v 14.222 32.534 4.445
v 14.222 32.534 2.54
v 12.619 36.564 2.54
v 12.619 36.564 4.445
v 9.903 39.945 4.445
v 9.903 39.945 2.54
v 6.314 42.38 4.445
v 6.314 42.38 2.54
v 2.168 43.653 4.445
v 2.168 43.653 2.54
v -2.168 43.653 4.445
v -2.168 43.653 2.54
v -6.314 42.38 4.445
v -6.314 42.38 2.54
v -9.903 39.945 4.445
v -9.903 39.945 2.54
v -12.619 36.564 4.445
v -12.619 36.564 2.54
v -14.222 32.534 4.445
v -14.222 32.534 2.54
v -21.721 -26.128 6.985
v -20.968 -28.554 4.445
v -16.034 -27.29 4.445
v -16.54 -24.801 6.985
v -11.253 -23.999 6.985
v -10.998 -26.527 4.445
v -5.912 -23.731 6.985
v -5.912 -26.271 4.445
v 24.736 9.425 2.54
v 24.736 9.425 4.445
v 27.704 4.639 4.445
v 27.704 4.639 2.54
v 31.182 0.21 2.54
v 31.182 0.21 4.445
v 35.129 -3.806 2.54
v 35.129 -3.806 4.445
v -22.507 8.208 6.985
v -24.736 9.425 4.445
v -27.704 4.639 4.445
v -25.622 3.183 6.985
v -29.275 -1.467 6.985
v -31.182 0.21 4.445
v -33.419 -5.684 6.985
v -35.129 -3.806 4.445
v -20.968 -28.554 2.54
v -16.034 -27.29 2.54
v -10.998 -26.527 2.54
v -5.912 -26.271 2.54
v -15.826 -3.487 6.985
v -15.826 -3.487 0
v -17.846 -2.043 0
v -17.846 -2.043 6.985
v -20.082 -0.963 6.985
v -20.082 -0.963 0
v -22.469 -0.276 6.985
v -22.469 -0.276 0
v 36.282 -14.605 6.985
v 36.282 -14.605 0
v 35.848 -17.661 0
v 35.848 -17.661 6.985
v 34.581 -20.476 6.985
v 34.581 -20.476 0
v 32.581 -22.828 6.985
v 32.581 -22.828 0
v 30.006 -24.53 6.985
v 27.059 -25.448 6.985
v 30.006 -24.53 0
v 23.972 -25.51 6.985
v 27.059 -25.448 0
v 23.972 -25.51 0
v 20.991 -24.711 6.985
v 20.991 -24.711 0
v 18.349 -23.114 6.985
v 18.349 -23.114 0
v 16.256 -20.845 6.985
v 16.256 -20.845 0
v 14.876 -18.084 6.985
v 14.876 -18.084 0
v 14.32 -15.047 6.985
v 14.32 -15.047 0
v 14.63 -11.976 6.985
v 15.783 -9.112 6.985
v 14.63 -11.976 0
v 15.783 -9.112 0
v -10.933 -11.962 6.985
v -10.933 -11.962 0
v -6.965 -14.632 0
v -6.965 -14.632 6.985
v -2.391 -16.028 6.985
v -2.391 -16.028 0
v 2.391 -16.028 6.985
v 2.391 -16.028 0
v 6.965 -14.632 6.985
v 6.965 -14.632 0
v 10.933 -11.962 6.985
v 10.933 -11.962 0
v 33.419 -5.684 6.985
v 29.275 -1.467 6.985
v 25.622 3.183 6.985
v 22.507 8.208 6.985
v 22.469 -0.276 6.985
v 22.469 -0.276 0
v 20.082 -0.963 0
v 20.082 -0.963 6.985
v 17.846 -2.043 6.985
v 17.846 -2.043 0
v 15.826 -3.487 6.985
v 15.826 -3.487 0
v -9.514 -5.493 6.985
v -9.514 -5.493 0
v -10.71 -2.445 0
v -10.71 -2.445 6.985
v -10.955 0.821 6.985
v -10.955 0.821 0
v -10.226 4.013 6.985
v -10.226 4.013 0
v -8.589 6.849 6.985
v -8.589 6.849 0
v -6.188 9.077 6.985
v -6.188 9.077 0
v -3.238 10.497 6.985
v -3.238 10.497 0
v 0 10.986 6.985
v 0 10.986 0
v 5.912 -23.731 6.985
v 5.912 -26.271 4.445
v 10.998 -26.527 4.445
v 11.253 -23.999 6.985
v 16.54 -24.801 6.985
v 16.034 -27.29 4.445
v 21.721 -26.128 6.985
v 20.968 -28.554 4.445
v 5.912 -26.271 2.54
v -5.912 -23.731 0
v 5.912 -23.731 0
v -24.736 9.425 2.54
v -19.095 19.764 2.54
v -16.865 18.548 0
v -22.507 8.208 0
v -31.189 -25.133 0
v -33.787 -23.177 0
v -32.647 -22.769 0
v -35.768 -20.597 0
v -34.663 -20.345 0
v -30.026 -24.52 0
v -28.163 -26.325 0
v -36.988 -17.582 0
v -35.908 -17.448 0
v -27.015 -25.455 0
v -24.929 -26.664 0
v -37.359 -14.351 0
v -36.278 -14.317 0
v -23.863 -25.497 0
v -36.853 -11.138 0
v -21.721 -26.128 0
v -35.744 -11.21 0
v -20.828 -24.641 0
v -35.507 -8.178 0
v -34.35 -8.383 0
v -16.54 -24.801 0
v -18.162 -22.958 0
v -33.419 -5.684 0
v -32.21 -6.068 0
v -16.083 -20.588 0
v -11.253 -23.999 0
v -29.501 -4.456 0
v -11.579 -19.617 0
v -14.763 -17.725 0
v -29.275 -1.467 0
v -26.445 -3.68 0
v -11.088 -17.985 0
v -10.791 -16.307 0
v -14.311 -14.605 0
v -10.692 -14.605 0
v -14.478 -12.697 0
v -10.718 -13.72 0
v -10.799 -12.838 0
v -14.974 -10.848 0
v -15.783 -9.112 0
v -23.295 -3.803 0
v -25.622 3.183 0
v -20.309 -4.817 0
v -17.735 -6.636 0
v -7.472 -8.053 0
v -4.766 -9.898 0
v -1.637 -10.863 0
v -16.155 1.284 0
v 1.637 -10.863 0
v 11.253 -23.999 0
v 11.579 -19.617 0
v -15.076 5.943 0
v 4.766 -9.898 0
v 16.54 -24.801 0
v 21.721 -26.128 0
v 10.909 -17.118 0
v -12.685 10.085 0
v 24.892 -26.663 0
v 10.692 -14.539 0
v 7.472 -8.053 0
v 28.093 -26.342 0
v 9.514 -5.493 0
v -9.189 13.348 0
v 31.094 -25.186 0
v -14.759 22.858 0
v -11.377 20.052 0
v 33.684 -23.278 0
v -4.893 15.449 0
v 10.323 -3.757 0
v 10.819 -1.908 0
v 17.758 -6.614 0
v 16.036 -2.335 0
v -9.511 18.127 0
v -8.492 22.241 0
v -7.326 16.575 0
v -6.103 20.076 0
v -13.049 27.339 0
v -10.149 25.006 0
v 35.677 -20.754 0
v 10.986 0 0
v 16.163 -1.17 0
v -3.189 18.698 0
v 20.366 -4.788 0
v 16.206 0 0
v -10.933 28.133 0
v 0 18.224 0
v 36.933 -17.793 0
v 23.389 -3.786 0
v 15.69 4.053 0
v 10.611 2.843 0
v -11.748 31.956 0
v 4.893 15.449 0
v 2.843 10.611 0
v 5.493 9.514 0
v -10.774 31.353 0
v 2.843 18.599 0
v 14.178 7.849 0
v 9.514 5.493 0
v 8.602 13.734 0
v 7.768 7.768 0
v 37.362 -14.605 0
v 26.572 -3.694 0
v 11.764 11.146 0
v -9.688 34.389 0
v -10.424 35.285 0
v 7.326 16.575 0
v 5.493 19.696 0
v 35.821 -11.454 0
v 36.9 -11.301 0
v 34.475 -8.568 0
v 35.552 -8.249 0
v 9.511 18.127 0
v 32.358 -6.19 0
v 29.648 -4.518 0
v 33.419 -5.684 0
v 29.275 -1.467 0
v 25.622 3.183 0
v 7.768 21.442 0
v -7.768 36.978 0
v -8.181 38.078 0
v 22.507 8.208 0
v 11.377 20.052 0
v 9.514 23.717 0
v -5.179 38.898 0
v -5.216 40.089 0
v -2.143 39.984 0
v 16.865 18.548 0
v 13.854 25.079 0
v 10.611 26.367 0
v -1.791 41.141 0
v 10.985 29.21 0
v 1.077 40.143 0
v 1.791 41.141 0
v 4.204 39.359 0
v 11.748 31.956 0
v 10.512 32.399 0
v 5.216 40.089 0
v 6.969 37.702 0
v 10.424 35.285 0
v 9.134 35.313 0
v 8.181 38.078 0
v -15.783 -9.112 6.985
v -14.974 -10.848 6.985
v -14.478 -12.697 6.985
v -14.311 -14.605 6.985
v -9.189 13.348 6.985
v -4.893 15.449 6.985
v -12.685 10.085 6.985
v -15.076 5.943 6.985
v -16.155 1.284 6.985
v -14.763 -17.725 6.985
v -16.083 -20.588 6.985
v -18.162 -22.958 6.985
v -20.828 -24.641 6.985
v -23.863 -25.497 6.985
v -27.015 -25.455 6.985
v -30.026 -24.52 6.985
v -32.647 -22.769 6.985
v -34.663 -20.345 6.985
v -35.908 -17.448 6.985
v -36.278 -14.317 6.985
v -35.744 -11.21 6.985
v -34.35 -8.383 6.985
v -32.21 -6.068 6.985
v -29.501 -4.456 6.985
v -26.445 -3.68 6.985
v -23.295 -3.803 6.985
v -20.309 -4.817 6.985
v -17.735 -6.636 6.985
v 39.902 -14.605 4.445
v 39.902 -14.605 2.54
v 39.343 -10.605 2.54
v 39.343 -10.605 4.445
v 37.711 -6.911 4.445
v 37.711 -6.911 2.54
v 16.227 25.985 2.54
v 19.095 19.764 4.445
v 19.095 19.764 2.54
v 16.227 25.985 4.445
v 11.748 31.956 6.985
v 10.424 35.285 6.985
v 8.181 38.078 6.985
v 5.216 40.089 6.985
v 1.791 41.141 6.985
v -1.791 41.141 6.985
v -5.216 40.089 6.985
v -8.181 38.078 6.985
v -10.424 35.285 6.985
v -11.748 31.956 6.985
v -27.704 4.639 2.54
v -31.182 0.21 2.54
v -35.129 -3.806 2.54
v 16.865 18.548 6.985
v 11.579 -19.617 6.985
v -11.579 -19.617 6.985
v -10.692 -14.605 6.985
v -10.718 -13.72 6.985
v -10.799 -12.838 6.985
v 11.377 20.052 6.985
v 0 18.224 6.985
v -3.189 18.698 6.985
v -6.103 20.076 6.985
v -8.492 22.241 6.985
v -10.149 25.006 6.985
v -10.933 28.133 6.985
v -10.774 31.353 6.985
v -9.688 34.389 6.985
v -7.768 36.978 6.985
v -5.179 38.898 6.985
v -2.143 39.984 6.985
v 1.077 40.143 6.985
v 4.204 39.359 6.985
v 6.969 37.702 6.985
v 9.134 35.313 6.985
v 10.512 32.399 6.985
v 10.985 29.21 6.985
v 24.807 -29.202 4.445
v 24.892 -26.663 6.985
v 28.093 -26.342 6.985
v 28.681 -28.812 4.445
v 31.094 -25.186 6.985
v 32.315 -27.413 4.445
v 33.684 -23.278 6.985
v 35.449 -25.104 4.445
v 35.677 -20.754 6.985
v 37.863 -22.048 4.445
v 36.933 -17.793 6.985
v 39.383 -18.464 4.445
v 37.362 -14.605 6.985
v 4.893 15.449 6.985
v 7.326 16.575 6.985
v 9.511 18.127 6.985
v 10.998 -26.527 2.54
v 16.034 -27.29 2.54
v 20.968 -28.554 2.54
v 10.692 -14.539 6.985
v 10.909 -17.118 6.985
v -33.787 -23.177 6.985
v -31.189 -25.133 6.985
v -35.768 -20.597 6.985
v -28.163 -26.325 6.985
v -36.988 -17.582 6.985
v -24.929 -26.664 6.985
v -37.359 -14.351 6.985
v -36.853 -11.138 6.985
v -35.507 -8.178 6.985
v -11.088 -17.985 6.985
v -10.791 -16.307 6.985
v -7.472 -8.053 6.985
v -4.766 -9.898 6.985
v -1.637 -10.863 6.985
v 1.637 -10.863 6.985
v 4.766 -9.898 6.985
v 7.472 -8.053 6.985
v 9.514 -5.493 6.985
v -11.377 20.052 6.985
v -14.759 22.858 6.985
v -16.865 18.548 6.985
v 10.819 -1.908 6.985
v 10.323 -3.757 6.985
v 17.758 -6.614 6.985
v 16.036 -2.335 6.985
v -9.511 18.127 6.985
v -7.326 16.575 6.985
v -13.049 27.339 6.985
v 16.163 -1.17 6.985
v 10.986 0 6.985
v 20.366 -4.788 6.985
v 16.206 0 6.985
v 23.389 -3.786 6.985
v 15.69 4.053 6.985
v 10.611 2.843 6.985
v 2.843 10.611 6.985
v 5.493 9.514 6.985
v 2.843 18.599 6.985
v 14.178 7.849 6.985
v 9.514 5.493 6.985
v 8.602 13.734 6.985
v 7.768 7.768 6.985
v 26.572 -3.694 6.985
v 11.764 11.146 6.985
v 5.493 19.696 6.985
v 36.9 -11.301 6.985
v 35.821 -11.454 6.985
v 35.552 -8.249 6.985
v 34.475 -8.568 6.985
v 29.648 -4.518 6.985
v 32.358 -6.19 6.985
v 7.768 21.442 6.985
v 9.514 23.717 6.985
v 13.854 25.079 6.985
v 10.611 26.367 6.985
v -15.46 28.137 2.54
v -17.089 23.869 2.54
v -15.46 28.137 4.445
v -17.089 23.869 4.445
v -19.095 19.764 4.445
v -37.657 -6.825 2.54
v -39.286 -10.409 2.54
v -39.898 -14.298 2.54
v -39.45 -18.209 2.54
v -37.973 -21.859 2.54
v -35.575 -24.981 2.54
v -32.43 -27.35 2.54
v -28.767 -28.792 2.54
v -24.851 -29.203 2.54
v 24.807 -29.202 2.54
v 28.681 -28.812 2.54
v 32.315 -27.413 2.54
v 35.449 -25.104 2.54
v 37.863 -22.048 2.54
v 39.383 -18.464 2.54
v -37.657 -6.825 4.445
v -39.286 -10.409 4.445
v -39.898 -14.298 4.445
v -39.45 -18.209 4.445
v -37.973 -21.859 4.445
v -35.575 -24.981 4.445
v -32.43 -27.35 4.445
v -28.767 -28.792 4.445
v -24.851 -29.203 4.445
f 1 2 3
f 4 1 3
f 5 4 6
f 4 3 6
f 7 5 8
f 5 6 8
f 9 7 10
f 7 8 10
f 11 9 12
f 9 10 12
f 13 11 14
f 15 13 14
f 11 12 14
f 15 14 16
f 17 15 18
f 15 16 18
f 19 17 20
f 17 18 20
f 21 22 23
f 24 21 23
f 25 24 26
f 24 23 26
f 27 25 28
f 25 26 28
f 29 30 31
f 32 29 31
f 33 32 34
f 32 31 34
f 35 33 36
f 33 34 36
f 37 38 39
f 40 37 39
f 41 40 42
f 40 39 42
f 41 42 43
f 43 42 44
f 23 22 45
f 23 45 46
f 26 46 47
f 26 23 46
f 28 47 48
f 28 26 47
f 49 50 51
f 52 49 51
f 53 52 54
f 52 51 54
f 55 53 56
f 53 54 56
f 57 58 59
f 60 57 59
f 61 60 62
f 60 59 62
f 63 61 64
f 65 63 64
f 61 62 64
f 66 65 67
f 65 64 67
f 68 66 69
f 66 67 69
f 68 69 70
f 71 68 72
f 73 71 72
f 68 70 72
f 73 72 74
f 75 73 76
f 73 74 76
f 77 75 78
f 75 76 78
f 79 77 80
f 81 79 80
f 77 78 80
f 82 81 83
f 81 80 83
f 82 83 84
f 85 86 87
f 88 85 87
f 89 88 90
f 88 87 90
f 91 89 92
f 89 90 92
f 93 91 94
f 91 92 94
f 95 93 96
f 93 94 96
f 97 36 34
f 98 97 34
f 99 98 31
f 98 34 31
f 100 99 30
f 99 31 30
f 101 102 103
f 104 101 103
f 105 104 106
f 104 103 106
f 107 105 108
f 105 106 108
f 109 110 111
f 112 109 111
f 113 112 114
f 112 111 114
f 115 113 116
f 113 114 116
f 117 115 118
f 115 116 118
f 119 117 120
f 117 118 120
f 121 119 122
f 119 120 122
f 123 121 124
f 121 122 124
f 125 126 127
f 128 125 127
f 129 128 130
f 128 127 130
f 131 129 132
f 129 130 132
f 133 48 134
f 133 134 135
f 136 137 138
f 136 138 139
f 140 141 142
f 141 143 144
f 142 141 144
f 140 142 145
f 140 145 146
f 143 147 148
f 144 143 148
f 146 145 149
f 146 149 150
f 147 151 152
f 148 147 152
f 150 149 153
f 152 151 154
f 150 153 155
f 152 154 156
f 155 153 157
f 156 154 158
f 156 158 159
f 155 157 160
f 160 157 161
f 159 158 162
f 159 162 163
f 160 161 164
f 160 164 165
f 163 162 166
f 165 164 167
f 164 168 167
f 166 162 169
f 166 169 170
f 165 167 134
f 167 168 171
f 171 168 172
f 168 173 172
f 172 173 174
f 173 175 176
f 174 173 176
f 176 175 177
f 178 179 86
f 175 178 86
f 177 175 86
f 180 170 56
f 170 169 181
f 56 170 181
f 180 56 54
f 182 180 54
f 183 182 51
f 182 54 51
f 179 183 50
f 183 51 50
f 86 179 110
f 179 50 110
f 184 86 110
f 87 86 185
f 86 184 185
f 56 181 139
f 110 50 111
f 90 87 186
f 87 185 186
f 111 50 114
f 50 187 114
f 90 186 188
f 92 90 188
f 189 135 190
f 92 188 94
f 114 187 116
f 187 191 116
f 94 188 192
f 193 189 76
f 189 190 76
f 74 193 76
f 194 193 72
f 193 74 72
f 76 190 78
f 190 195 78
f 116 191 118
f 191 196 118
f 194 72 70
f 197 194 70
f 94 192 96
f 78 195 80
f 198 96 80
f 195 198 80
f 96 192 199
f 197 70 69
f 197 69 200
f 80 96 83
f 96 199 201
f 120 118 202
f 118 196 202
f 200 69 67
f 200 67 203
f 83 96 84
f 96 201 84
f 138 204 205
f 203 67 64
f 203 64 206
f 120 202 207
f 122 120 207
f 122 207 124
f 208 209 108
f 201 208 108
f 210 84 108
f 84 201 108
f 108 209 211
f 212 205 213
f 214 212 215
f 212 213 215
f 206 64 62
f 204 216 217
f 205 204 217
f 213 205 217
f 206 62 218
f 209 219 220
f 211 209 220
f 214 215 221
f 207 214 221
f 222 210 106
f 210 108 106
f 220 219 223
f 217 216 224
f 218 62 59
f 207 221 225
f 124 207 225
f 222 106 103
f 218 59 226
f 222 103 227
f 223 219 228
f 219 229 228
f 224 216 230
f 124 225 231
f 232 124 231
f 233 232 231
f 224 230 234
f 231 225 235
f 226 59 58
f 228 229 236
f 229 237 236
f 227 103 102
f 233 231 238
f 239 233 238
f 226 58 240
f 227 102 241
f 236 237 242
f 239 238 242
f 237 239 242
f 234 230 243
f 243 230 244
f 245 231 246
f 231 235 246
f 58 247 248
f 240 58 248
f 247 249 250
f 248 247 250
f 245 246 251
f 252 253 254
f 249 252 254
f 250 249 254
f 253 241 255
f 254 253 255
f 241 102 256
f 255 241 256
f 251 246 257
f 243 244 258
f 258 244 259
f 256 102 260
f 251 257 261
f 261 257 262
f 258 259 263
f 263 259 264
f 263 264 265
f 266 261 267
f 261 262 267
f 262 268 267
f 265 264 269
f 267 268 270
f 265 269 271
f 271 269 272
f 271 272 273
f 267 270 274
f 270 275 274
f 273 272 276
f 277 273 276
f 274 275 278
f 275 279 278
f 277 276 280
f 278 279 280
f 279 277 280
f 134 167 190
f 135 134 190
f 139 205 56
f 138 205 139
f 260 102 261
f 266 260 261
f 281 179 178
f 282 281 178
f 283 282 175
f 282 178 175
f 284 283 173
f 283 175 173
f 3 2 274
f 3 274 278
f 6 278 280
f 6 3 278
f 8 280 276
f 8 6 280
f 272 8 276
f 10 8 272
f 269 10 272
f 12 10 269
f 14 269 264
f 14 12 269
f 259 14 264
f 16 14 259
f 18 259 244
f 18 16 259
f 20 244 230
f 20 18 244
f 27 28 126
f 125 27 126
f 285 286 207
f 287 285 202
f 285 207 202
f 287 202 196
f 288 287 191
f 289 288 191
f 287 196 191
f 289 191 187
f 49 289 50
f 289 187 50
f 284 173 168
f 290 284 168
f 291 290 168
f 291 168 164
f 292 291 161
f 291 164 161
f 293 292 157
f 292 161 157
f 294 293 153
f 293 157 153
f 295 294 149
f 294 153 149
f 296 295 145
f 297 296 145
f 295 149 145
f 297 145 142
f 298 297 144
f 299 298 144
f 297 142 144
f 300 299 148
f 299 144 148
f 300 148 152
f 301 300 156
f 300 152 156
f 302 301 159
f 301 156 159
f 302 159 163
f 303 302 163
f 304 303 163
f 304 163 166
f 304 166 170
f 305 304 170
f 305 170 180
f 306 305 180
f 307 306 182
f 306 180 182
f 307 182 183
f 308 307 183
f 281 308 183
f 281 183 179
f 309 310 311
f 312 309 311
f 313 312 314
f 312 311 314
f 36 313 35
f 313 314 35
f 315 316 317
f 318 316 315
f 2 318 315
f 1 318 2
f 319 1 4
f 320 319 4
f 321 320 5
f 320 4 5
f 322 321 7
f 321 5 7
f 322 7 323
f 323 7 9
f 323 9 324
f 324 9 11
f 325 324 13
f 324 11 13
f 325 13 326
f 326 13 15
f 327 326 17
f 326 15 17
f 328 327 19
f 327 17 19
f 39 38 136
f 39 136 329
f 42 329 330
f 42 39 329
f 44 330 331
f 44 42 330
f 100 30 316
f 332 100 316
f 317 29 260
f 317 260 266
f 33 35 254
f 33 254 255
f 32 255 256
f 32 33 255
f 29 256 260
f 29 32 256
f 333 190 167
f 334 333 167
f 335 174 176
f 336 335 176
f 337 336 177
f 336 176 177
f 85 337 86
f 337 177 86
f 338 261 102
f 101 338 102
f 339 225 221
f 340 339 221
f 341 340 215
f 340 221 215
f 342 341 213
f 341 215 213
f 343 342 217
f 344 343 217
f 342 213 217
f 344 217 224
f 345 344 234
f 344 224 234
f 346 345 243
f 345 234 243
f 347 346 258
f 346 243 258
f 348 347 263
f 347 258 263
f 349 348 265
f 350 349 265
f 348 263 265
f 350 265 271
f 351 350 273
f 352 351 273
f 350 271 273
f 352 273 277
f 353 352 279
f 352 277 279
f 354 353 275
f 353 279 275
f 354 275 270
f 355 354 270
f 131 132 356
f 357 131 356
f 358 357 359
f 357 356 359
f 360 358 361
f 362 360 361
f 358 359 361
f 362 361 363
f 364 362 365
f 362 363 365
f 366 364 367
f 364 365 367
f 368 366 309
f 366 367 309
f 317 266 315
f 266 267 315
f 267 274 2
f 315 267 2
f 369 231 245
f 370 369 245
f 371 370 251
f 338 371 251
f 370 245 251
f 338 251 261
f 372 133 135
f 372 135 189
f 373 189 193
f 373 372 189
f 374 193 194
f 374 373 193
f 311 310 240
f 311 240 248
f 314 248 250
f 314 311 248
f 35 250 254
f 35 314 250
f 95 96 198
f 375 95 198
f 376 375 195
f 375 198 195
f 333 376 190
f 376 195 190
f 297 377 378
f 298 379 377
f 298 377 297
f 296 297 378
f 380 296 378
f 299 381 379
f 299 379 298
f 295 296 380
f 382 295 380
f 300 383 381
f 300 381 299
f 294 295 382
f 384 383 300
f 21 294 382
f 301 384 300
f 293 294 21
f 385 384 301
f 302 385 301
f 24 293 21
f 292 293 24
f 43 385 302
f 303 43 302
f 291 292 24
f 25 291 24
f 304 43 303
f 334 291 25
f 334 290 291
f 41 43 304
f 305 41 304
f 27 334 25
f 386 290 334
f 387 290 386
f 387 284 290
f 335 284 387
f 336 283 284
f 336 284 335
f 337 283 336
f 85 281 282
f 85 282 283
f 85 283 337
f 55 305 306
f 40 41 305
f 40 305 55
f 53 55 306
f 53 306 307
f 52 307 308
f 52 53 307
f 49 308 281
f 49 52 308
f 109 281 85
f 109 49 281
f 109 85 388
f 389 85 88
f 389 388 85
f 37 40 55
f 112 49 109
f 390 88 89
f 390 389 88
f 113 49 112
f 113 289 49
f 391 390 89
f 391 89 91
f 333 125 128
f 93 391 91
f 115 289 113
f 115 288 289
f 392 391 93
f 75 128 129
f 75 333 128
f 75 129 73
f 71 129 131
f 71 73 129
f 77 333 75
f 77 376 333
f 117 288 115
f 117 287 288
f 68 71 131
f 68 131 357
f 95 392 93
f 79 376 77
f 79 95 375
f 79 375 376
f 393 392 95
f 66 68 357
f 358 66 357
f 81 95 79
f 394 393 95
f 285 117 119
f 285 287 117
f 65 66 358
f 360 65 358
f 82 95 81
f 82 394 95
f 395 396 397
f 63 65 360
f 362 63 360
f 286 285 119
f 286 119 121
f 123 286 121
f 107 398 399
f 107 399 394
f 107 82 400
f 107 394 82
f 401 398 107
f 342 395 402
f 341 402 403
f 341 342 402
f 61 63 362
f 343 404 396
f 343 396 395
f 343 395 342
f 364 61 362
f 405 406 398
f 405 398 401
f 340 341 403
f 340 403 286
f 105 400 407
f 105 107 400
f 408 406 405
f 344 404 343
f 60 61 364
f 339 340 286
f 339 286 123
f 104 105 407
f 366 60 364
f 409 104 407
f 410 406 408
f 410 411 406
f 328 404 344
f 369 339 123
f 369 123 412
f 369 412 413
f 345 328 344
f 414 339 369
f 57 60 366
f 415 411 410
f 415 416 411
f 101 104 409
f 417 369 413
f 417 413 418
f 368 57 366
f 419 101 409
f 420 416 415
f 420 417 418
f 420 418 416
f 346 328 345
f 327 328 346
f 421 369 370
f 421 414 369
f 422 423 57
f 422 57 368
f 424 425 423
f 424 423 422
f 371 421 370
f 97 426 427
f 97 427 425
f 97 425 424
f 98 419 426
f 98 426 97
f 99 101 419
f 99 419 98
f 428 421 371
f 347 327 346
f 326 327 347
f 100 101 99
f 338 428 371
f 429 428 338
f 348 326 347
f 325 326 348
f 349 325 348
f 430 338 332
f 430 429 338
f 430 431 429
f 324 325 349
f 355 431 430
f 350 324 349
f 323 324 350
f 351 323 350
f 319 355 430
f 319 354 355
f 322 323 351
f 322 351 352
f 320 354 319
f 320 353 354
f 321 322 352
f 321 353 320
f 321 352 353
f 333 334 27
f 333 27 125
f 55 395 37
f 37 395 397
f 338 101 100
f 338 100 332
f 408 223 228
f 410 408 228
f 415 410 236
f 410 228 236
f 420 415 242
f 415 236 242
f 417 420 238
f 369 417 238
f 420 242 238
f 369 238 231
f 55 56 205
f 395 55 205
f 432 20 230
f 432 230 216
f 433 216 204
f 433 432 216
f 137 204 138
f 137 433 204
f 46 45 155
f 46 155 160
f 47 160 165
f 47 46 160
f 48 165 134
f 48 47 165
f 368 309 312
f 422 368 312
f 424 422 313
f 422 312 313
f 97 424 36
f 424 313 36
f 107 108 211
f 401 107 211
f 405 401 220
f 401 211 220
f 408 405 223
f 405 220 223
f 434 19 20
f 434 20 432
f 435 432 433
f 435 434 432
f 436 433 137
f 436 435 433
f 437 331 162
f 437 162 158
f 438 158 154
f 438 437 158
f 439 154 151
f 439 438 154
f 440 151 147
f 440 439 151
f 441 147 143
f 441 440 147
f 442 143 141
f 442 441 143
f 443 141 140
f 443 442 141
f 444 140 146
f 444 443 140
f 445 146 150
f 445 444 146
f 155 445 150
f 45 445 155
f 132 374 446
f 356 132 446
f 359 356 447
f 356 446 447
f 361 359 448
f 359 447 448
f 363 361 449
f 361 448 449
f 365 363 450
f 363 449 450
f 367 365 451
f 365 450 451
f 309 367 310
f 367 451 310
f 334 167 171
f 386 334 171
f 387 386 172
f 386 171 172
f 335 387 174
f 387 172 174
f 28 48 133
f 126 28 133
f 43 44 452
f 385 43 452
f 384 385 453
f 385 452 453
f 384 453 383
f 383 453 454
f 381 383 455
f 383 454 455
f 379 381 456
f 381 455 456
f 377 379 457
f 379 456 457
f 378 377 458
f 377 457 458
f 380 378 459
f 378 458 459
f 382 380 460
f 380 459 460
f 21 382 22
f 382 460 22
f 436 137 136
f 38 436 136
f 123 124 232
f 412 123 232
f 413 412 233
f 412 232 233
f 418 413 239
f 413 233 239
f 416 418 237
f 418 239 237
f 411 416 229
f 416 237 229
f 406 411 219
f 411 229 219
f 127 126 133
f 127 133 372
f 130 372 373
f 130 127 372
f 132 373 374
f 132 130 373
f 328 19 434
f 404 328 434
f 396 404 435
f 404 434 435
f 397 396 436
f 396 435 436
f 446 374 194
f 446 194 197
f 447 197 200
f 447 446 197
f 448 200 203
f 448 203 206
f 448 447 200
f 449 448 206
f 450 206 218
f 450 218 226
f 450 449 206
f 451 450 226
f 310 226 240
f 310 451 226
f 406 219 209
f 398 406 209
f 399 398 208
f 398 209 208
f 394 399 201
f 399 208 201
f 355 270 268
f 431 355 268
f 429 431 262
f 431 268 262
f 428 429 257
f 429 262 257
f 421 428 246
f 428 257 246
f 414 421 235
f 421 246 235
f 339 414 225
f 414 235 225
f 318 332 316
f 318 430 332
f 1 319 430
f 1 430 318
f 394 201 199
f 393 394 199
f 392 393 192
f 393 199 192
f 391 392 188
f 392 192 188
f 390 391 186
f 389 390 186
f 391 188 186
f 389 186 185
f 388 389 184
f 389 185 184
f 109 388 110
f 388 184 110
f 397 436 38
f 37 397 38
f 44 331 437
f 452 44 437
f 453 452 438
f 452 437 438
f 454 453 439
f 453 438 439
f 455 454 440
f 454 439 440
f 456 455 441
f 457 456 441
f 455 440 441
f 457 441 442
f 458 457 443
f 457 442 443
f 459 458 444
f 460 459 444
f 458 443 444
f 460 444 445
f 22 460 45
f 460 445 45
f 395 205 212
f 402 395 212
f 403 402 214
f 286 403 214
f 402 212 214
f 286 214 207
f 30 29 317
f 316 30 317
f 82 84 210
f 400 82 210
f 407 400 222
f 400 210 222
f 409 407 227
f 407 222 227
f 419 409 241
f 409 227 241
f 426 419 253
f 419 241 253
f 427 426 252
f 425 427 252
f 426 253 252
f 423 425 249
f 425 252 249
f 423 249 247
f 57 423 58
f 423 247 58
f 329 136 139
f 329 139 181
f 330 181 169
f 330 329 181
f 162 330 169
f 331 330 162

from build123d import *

# Parameters (mm, degrees)
F1_DEPTH = 6.985
F2_R     = 50.8
F3_SIZE  = 2.54


with BuildPart() as f1:
    # F0 (on Top) → F1 (new body)
    with BuildSketch(Plane.XY):
        with BuildLine():
            Line((-22.4686733496, -0.2763976852), (-11.3768203047, 20.0517258855))
            ThreePointArc((-11.3768203047, 20.0517258855), (-13.5749073132, 23.8222438401), (-14.5607446546, 28.0738925649))
            Line((-14.5607446546, 28.0738925649), (-30.3766020445, -0.9119497554))
            ThreePointArc((-30.3766020445, -0.9119497554), (-26.4666182407, -0.0469408196), (-22.4686733496, -0.2763976852))
        make_face()
        with BuildLine():
            ThreePointArc((14.5607446546, 28.0738925649), (13.5749073132, 23.8222438401), (11.3768203047, 20.0517258855))
            Line((11.3768203047, 20.0517258855), (22.4686733496, -0.2763976852))
            ThreePointArc((22.4686733496, -0.2763976852), (26.4666182407, -0.0469408196), (30.3766020445, -0.9119497554))
            Line((30.3766020445, -0.9119497554), (14.5607446546, 28.0738925649))
        make_face()
        with BuildLine():
            ThreePointArc((-4.8932738406, 15.4491171751), (-2.4756966767, 16.0153138069), (0, 16.2055345598))
            ThreePointArc((0, 16.2055345598), (2.4756966767, 16.0153138069), (4.8932738406, 15.4491171751))
            ThreePointArc((4.8932738406, 15.4491171751), (8.4542884153, 17.3007165459), (11.3768203047, 20.0517258855))
            ThreePointArc((11.3768203047, 20.0517258855), (13.5749073132, 23.8222438401), (14.5607446546, 28.0738925649))
            ThreePointArc((14.5607446546, 28.0738925649), (14.5939319698, 28.6415154708), (14.605, 29.21))
            ThreePointArc((14.605, 29.21), (-0.5684845292, 43.8039319698), (-14.5607446546, 28.0738925649))
            ThreePointArc((-14.5607446546, 28.0738925649), (-13.5749073132, 23.8222438401), (-11.3768203047, 20.0517258855))
            ThreePointArc((-11.3768203047, 20.0517258855), (-8.4542884153, 17.3007165459), (-4.8932738406, 15.4491171751))
        make_face()
        with BuildLine():
            ThreePointArc((10.9855, 29.21), (7.7679215447, 21.4420784553), (0, 18.2245))
            ThreePointArc((0, 18.2245), (-7.7679215447, 36.9779215447), (10.9855, 29.21))
        make_face(mode=Mode.SUBTRACT)
        with BuildLine():
            Line((0, 16.2055345598), (0, 14.605))
            ThreePointArc((0, 14.605), (2.4827737857, 14.8175763219), (4.8932738406, 15.4491171751))
            ThreePointArc((4.8932738406, 15.4491171751), (2.4756966767, 16.0153138069), (0, 16.2055345598))
        make_face()
        with BuildLine():
            ThreePointArc((-4.8932738406, 15.4491171751), (-2.4827737857, 14.8175763219), (0, 14.605))
            Line((0, 14.605), (0, 16.2055345598))
            ThreePointArc((0, 16.2055345598), (-2.4756966767, 16.0153138069), (-4.8932738406, 15.4491171751))
        make_face()
        with BuildLine():
            ThreePointArc((0, 10.9855), (7.7679215447, 7.7679215447), (10.9855, 0))
            ThreePointArc((10.9855, 0), (10.6111781647, -2.84325662), (9.5137220733, -5.49275))
            Line((9.5137220733, -5.49275), (12.6483010223, -7.3025))
            ThreePointArc((12.6483010223, -7.3025), (14.0737844102, -5.2586429907), (15.82596486, -3.4868591339))
            ThreePointArc((15.82596486, -3.4868591339), (16.1103626721, -1.7537288685), (16.2055345598, 0))
            ThreePointArc((16.2055345598, 0), (13.0751189039, 9.5739550875), (4.8932738406, 15.4491171751))
            ThreePointArc((4.8932738406, 15.4491171751), (2.4827737857, 14.8175763219), (0, 14.605))
            Line((0, 14.605), (0, 10.9855))
        make_face()
        with BuildLine():
            ThreePointArc((-9.5137220733, -5.49275), (-9.5137220733, 5.49275), (0, 10.9855))
            Line((0, 10.9855), (0, 14.605))
            ThreePointArc((0, 14.605), (-2.4827737857, 14.8175763219), (-4.8932738406, 15.4491171751))
            ThreePointArc((-4.8932738406, 15.4491171751), (-14.0344046107, 8.1027672799), (-15.82596486, -3.4868591339))
            ThreePointArc((-15.82596486, -3.4868591339), (-14.0737844102, -5.2586429907), (-12.6483010223, -7.3025))
            Line((-12.6483010223, -7.3025), (-9.5137220733, -5.49275))
        make_face()
        with BuildLine():
            Line((12.6483010223, -7.3025), (9.5137220733, -5.49275))
            ThreePointArc((9.5137220733, -5.49275), (0, -10.9855), (-9.5137220733, -5.49275))
            Line((-9.5137220733, -5.49275), (-12.6483010223, -7.3025))
            ThreePointArc((-12.6483010223, -7.3025), (-11.5910106244, -9.5589333313), (-10.9326910194, -11.9622580412))
            ThreePointArc((-10.9326910194, -11.9622580412), (0, -16.2055345598), (10.9326910194, -11.9622580412))
            ThreePointArc((10.9326910194, -11.9622580412), (11.5910106244, -9.5589333313), (12.6483010223, -7.3025))
        make_face()
        with BuildLine():
            ThreePointArc((16.51, -26.2712611625), (13.5628030503, -23.3012052737), (11.5786636953, -19.6174038591))
            Line((11.5786636953, -19.6174038591), (-11.5786636953, -19.6174038591))
            ThreePointArc((-11.5786636953, -19.6174038591), (-13.5628030503, -23.3012052737), (-16.51, -26.2712611625))
            Line((-16.51, -26.2712611625), (16.51, -26.2712611625))
        make_face()
        with BuildLine():
            ThreePointArc((-10.9326910194, -11.9622580412), (-12.6318202681, -10.1516731175), (-14.0344046107, -8.1027672799))
            ThreePointArc((-14.0344046107, -8.1027672799), (-15.1075169447, -5.8636406894), (-15.82596486, -3.4868591339))
            ThreePointArc((-15.82596486, -3.4868591339), (-18.94125419, -1.4552631719), (-22.4686733496, -0.2763976852))
            ThreePointArc((-22.4686733496, -0.2763976852), (-26.4666182407, -0.0469408196), (-30.3766020445, -0.9119497554))
            ThreePointArc((-30.3766020445, -0.9119497554), (-38.1109843332, -21.6119702127), (-16.51, -26.2712611625))
            ThreePointArc((-16.51, -26.2712611625), (-13.5628030503, -23.3012052737), (-11.5786636953, -19.6174038591))
            ThreePointArc((-11.5786636953, -19.6174038591), (-10.9150771847, -17.1501459103), (-10.6916020445, -14.605))
            ThreePointArc((-10.6916020445, -14.605), (-10.7519991706, -13.2781419674), (-10.9326910194, -11.9622580412))
        make_face()
        with BuildLine():
            ThreePointArc((-14.3111020445, -14.605), (-35.9077802092, -17.44825662), (-15.7828799713, -9.11225))
            ThreePointArc((-15.7828799713, -9.11225), (-14.6854238798, -11.76174338), (-14.3111020445, -14.605))
        make_face(mode=Mode.SUBTRACT)
        with BuildLine():
            ThreePointArc((-10.9326910194, -11.9622580412), (-11.5910106244, -9.5589333313), (-12.6483010223, -7.3025))
            Line((-12.6483010223, -7.3025), (-14.0344046107, -8.1027672799))
            ThreePointArc((-14.0344046107, -8.1027672799), (-12.6318202681, -10.1516731175), (-10.9326910194, -11.9622580412))
        make_face()
        with BuildLine():
            Line((-14.0344046107, -8.1027672799), (-12.6483010223, -7.3025))
            ThreePointArc((-12.6483010223, -7.3025), (-14.0737844102, -5.2586429907), (-15.82596486, -3.4868591339))
            ThreePointArc((-15.82596486, -3.4868591339), (-15.1075169447, -5.8636406894), (-14.0344046107, -8.1027672799))
        make_face()
        with BuildLine():
            Line((14.0344046107, -8.1027672799), (12.6483010223, -7.3025))
            ThreePointArc((12.6483010223, -7.3025), (11.5910106244, -9.5589333313), (10.9326910194, -11.9622580412))
            ThreePointArc((10.9326910194, -11.9622580412), (12.6318202681, -10.1516731175), (14.0344046107, -8.1027672799))
        make_face()
        with BuildLine():
            ThreePointArc((15.82596486, -3.4868591339), (15.1075169447, -5.8636406894), (14.0344046107, -8.1027672799))
            ThreePointArc((14.0344046107, -8.1027672799), (12.6318202681, -10.1516731175), (10.9326910194, -11.9622580412))
            ThreePointArc((10.9326910194, -11.9622580412), (10.7433247351, -15.8330653708), (11.5786636953, -19.6174038591))
            ThreePointArc((11.5786636953, -19.6174038591), (13.5628030503, -23.3012052737), (16.51, -26.2712611625))
            ThreePointArc((16.51, -26.2712611625), (31.8149493097, -27.6747044316), (39.9016020445, -14.605))
            ThreePointArc((39.9016020445, -14.605), (37.2861688632, -6.2649572843), (30.3766020445, -0.9119497554))
            ThreePointArc((30.3766020445, -0.9119497554), (26.4666182407, -0.0469408196), (22.4686733496, -0.2763976852))
            ThreePointArc((22.4686733496, -0.2763976852), (18.94125419, -1.4552631719), (15.82596486, -3.4868591339))
        make_face()
        with BuildLine():
            ThreePointArc((36.2821020445, -14.605), (22.4533454246, -25.2161781647), (15.7828799713, -9.11225))
            ThreePointArc((15.7828799713, -9.11225), (28.1398586645, -3.9938218353), (36.2821020445, -14.605))
        make_face(mode=Mode.SUBTRACT)
        with BuildLine():
            ThreePointArc((15.82596486, -3.4868591339), (14.0737844102, -5.2586429907), (12.6483010223, -7.3025))
            Line((12.6483010223, -7.3025), (14.0344046107, -8.1027672799))
            ThreePointArc((14.0344046107, -8.1027672799), (15.1075169447, -5.8636406894), (15.82596486, -3.4868591339))
        make_face()
    extrude(amount=F1_DEPTH)

    # F2
    f2_edges = [f1.edges().sort_by_distance(p)[0] for p in [
        (-14.560745, 28.073893, 3.4925),
        (-30.376602, -0.91195, 3.4925),
        (16.51, -26.271261, 3.4925),
        (-16.51, -26.271261, 3.4925),
        (14.560745, 28.073893, 3.4925),
        (30.376602, -0.91195, 3.4925),
    ]]
    fillet(f2_edges, radius=F2_R)

    # F3
    f3_edges = [f1.edges().sort_by_distance(p)[0] for p in [
        (-37.972945, -21.858713, 0),
        (-37.972945, -21.858713, 6.985),
    ]]
    chamfer(f3_edges, length=F3_SIZE)


solid = f1.part
